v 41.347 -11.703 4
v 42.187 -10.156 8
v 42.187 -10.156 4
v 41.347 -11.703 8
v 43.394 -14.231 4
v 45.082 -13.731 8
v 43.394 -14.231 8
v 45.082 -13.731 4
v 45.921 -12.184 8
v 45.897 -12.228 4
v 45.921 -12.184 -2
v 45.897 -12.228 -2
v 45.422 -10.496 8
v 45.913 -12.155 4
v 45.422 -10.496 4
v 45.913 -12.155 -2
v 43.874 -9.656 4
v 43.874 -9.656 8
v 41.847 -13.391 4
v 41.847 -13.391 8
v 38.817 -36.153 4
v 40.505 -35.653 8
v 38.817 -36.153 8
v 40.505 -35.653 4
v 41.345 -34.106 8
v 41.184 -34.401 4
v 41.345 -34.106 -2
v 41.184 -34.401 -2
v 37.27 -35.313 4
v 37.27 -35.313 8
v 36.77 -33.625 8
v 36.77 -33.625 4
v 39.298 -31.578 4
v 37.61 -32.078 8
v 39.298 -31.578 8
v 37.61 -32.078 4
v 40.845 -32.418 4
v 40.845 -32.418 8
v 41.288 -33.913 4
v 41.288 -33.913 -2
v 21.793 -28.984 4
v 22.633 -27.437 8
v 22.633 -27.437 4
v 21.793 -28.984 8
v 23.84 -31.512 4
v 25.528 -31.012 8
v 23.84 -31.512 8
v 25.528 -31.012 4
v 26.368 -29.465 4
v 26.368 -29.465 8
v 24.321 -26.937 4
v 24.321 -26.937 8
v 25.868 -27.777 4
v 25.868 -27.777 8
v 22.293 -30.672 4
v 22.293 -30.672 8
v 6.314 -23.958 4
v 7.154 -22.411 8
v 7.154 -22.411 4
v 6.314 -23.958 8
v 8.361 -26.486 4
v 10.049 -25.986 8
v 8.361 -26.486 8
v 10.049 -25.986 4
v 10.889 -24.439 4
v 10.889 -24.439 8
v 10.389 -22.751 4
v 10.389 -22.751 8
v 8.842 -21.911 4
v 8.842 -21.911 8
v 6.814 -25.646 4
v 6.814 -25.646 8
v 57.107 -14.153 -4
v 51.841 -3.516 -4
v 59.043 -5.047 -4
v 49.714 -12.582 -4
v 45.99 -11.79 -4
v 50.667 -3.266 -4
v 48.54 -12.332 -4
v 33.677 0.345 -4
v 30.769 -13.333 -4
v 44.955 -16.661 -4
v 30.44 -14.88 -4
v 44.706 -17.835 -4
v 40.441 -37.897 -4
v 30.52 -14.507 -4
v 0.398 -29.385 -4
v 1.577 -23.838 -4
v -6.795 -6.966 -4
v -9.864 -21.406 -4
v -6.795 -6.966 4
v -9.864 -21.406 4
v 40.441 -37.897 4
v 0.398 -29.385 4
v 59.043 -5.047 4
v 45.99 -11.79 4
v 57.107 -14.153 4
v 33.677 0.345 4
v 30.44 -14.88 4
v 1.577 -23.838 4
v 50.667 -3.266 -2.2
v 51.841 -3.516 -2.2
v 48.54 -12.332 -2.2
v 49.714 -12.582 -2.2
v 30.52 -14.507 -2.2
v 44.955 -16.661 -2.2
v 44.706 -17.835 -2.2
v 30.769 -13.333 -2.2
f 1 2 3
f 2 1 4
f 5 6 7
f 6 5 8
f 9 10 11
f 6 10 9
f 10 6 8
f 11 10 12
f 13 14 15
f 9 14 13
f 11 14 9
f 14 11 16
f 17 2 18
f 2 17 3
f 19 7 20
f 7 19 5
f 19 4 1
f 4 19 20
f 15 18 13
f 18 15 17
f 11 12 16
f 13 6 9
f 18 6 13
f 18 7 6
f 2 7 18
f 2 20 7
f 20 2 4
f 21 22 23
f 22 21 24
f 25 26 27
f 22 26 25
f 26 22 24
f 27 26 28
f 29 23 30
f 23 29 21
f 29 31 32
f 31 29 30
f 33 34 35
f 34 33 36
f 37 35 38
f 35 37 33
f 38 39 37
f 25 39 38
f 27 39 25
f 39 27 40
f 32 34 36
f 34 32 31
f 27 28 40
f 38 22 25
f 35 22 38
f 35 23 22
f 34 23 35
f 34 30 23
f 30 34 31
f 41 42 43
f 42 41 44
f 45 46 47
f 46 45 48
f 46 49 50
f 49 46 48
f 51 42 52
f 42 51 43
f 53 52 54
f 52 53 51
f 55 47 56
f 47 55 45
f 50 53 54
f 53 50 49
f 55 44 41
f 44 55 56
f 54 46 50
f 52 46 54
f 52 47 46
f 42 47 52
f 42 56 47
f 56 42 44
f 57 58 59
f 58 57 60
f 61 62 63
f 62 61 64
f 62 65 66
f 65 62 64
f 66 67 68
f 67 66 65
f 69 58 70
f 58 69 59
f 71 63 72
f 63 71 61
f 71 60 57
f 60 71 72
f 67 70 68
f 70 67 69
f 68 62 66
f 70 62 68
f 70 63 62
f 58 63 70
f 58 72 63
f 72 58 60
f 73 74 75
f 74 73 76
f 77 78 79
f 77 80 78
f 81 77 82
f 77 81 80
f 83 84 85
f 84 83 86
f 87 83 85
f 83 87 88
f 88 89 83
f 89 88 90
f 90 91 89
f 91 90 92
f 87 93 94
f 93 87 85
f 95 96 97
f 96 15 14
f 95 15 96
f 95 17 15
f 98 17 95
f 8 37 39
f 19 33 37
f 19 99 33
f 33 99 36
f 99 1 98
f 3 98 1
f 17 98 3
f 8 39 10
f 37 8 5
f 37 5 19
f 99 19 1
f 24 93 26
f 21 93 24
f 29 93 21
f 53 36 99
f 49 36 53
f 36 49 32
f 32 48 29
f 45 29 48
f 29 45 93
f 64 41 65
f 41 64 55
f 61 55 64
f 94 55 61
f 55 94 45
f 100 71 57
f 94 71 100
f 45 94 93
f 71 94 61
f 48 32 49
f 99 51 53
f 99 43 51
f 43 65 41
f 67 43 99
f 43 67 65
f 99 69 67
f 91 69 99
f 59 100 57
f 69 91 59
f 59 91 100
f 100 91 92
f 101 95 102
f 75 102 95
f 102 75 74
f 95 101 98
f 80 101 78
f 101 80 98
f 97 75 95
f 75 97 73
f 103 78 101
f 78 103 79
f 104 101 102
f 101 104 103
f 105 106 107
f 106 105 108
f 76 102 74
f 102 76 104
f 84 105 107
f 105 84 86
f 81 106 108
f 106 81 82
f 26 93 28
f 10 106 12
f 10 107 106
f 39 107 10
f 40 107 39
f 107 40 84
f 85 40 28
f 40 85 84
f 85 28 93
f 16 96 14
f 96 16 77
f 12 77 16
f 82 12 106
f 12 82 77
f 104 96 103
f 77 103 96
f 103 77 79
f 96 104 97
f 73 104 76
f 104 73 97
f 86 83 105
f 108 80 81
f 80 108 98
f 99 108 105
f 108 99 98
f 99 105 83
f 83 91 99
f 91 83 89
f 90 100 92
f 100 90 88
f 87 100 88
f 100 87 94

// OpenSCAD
//
// Block to hold tubing and modulate liquid flow
// 

module rotary()
{
	module hole(r, h) {
		rotate([0,0,0])
			cylinder(r=r, h=h,center=true);
	}
	// MOUNTING POSTS
	module posts() {
	 translate([114.26,0,-3])
	   hole(hradius, thickplus);
 	 translate([112,22.28,-3])
 	   hole(hradius, thickplus);

//   translate([98.61, 0, -3])
//	   hole( hradius, thickplus);
   translate([96.62, 19.23, -3])
	   hole( hradius, thickplus);

   translate([80.7, 15.85, -3])
	   hole( hradius, thickplus);
   }

    translate([-70,0,0]) rotate([0,0,alpha/2]) posts();
	difference() {
	// BODY (to be subtracted from)
	 translate([long,width/3+4,0])
	  rotate([0,0,alpha])
	   cube([length,width,thick],center=true);

	// WIRE TROUGH
	 translate([long+25,1+width/3,thickplus/2-dia])
	   rotate([0,0,90+1.1*alpha])
            cube([2*length,dia, dia+2],center=true);

	 translate([long+4,1.3+width/3,thickplus/2-dia])
	   rotate([0,0,1.1*alpha])
            cube([2*length, dia, dia+2],center=true);

    // WIRE CUT-OUT
	 translate([long+width-10,width-7,0])
	  rotate([0,0,alpha])
	   cube([15,32,thickplus],center=true);

	// CORNER CUT-OUTS
// lower left
	 translate([long-width/2,0,0])
	  rotate([0,0,alpha])
	   cube([length-10,width/1.9,thickplus],center=true);
// upper right
//	 translate([long+18,width-2,0])
//	  rotate([0,0,alpha])
//	   cube([length/2,2+width/3,thickplus],center=true);

// Upper left
	 translate([medium-20,width-9,0])
	  rotate([0,0,alpha])
	   cube([length/3,2+width/4,thickplus],center=true);
}

	alpha  = 12; // Angle between radials in degrees

	length = 64; // mm   Main Block
	width  = 36; // mm
	thick = 8;  // 8mm

	thickplus = thick + 2;  // plus margin

	long   = 24; // mm  // Distances from center
	medium = 10; // mm
//	long   = 154; // mm  // Distances from center
//	medium = 133; // mm
	short  = 120; // mm

	hradius = 2.3;    // mounting hole radius mm
	dia     = 1.2;  // wire trough mm
	offset  = 5.6;  // distance from edge to mounting hole
}

rotate([180,0,0]) rotary();
